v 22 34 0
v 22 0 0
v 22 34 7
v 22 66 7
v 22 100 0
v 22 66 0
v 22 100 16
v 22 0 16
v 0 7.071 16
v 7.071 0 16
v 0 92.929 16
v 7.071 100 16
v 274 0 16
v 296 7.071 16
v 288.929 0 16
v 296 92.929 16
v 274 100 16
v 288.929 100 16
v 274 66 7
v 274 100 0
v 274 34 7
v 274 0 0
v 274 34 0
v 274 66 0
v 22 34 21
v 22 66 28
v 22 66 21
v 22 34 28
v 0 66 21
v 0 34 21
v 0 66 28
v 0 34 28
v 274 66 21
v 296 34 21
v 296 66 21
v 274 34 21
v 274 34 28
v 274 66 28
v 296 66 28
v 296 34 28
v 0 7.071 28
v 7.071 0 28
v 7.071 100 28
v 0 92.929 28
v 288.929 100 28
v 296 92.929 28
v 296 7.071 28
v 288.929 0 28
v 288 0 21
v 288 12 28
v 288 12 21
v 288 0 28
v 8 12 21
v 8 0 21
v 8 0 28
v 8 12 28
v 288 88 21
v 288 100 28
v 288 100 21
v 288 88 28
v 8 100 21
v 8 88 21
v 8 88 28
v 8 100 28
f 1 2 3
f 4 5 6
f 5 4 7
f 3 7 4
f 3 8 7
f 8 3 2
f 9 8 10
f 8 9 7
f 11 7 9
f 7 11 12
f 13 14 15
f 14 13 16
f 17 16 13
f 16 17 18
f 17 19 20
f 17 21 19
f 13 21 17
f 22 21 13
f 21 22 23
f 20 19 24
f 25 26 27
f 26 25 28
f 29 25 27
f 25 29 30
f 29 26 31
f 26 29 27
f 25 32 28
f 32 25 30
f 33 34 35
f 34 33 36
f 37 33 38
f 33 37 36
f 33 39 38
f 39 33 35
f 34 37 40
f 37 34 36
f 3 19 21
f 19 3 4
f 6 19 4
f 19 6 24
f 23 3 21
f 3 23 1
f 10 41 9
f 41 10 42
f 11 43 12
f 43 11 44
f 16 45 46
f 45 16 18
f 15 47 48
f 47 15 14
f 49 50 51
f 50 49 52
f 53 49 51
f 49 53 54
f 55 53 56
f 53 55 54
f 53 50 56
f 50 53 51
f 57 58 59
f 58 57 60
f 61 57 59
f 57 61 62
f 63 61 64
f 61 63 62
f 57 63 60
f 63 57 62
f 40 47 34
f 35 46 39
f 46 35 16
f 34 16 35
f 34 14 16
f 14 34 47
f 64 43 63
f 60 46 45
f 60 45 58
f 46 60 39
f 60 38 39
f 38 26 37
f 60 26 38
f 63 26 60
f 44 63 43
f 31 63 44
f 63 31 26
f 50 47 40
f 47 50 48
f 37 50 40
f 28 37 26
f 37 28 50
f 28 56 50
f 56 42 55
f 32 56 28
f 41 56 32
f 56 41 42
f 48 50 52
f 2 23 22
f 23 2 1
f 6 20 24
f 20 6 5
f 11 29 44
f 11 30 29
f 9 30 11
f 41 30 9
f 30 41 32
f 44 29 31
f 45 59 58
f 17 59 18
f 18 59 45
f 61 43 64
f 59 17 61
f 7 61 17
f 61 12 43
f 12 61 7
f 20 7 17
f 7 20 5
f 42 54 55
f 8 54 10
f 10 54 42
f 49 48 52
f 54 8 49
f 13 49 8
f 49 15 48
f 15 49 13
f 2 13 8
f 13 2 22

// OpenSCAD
include <../src/wardrobe.scad>;
plank_yx_middle_bottom();
//github_openscad -o wardrobe_2/plank_yx_middle_bottom.stl -D wardrobe_n=2 -D cutting_edge=0 -D break_view_length=0 wardrobe_2/plank_yx_middle_bottom_stl.scad
